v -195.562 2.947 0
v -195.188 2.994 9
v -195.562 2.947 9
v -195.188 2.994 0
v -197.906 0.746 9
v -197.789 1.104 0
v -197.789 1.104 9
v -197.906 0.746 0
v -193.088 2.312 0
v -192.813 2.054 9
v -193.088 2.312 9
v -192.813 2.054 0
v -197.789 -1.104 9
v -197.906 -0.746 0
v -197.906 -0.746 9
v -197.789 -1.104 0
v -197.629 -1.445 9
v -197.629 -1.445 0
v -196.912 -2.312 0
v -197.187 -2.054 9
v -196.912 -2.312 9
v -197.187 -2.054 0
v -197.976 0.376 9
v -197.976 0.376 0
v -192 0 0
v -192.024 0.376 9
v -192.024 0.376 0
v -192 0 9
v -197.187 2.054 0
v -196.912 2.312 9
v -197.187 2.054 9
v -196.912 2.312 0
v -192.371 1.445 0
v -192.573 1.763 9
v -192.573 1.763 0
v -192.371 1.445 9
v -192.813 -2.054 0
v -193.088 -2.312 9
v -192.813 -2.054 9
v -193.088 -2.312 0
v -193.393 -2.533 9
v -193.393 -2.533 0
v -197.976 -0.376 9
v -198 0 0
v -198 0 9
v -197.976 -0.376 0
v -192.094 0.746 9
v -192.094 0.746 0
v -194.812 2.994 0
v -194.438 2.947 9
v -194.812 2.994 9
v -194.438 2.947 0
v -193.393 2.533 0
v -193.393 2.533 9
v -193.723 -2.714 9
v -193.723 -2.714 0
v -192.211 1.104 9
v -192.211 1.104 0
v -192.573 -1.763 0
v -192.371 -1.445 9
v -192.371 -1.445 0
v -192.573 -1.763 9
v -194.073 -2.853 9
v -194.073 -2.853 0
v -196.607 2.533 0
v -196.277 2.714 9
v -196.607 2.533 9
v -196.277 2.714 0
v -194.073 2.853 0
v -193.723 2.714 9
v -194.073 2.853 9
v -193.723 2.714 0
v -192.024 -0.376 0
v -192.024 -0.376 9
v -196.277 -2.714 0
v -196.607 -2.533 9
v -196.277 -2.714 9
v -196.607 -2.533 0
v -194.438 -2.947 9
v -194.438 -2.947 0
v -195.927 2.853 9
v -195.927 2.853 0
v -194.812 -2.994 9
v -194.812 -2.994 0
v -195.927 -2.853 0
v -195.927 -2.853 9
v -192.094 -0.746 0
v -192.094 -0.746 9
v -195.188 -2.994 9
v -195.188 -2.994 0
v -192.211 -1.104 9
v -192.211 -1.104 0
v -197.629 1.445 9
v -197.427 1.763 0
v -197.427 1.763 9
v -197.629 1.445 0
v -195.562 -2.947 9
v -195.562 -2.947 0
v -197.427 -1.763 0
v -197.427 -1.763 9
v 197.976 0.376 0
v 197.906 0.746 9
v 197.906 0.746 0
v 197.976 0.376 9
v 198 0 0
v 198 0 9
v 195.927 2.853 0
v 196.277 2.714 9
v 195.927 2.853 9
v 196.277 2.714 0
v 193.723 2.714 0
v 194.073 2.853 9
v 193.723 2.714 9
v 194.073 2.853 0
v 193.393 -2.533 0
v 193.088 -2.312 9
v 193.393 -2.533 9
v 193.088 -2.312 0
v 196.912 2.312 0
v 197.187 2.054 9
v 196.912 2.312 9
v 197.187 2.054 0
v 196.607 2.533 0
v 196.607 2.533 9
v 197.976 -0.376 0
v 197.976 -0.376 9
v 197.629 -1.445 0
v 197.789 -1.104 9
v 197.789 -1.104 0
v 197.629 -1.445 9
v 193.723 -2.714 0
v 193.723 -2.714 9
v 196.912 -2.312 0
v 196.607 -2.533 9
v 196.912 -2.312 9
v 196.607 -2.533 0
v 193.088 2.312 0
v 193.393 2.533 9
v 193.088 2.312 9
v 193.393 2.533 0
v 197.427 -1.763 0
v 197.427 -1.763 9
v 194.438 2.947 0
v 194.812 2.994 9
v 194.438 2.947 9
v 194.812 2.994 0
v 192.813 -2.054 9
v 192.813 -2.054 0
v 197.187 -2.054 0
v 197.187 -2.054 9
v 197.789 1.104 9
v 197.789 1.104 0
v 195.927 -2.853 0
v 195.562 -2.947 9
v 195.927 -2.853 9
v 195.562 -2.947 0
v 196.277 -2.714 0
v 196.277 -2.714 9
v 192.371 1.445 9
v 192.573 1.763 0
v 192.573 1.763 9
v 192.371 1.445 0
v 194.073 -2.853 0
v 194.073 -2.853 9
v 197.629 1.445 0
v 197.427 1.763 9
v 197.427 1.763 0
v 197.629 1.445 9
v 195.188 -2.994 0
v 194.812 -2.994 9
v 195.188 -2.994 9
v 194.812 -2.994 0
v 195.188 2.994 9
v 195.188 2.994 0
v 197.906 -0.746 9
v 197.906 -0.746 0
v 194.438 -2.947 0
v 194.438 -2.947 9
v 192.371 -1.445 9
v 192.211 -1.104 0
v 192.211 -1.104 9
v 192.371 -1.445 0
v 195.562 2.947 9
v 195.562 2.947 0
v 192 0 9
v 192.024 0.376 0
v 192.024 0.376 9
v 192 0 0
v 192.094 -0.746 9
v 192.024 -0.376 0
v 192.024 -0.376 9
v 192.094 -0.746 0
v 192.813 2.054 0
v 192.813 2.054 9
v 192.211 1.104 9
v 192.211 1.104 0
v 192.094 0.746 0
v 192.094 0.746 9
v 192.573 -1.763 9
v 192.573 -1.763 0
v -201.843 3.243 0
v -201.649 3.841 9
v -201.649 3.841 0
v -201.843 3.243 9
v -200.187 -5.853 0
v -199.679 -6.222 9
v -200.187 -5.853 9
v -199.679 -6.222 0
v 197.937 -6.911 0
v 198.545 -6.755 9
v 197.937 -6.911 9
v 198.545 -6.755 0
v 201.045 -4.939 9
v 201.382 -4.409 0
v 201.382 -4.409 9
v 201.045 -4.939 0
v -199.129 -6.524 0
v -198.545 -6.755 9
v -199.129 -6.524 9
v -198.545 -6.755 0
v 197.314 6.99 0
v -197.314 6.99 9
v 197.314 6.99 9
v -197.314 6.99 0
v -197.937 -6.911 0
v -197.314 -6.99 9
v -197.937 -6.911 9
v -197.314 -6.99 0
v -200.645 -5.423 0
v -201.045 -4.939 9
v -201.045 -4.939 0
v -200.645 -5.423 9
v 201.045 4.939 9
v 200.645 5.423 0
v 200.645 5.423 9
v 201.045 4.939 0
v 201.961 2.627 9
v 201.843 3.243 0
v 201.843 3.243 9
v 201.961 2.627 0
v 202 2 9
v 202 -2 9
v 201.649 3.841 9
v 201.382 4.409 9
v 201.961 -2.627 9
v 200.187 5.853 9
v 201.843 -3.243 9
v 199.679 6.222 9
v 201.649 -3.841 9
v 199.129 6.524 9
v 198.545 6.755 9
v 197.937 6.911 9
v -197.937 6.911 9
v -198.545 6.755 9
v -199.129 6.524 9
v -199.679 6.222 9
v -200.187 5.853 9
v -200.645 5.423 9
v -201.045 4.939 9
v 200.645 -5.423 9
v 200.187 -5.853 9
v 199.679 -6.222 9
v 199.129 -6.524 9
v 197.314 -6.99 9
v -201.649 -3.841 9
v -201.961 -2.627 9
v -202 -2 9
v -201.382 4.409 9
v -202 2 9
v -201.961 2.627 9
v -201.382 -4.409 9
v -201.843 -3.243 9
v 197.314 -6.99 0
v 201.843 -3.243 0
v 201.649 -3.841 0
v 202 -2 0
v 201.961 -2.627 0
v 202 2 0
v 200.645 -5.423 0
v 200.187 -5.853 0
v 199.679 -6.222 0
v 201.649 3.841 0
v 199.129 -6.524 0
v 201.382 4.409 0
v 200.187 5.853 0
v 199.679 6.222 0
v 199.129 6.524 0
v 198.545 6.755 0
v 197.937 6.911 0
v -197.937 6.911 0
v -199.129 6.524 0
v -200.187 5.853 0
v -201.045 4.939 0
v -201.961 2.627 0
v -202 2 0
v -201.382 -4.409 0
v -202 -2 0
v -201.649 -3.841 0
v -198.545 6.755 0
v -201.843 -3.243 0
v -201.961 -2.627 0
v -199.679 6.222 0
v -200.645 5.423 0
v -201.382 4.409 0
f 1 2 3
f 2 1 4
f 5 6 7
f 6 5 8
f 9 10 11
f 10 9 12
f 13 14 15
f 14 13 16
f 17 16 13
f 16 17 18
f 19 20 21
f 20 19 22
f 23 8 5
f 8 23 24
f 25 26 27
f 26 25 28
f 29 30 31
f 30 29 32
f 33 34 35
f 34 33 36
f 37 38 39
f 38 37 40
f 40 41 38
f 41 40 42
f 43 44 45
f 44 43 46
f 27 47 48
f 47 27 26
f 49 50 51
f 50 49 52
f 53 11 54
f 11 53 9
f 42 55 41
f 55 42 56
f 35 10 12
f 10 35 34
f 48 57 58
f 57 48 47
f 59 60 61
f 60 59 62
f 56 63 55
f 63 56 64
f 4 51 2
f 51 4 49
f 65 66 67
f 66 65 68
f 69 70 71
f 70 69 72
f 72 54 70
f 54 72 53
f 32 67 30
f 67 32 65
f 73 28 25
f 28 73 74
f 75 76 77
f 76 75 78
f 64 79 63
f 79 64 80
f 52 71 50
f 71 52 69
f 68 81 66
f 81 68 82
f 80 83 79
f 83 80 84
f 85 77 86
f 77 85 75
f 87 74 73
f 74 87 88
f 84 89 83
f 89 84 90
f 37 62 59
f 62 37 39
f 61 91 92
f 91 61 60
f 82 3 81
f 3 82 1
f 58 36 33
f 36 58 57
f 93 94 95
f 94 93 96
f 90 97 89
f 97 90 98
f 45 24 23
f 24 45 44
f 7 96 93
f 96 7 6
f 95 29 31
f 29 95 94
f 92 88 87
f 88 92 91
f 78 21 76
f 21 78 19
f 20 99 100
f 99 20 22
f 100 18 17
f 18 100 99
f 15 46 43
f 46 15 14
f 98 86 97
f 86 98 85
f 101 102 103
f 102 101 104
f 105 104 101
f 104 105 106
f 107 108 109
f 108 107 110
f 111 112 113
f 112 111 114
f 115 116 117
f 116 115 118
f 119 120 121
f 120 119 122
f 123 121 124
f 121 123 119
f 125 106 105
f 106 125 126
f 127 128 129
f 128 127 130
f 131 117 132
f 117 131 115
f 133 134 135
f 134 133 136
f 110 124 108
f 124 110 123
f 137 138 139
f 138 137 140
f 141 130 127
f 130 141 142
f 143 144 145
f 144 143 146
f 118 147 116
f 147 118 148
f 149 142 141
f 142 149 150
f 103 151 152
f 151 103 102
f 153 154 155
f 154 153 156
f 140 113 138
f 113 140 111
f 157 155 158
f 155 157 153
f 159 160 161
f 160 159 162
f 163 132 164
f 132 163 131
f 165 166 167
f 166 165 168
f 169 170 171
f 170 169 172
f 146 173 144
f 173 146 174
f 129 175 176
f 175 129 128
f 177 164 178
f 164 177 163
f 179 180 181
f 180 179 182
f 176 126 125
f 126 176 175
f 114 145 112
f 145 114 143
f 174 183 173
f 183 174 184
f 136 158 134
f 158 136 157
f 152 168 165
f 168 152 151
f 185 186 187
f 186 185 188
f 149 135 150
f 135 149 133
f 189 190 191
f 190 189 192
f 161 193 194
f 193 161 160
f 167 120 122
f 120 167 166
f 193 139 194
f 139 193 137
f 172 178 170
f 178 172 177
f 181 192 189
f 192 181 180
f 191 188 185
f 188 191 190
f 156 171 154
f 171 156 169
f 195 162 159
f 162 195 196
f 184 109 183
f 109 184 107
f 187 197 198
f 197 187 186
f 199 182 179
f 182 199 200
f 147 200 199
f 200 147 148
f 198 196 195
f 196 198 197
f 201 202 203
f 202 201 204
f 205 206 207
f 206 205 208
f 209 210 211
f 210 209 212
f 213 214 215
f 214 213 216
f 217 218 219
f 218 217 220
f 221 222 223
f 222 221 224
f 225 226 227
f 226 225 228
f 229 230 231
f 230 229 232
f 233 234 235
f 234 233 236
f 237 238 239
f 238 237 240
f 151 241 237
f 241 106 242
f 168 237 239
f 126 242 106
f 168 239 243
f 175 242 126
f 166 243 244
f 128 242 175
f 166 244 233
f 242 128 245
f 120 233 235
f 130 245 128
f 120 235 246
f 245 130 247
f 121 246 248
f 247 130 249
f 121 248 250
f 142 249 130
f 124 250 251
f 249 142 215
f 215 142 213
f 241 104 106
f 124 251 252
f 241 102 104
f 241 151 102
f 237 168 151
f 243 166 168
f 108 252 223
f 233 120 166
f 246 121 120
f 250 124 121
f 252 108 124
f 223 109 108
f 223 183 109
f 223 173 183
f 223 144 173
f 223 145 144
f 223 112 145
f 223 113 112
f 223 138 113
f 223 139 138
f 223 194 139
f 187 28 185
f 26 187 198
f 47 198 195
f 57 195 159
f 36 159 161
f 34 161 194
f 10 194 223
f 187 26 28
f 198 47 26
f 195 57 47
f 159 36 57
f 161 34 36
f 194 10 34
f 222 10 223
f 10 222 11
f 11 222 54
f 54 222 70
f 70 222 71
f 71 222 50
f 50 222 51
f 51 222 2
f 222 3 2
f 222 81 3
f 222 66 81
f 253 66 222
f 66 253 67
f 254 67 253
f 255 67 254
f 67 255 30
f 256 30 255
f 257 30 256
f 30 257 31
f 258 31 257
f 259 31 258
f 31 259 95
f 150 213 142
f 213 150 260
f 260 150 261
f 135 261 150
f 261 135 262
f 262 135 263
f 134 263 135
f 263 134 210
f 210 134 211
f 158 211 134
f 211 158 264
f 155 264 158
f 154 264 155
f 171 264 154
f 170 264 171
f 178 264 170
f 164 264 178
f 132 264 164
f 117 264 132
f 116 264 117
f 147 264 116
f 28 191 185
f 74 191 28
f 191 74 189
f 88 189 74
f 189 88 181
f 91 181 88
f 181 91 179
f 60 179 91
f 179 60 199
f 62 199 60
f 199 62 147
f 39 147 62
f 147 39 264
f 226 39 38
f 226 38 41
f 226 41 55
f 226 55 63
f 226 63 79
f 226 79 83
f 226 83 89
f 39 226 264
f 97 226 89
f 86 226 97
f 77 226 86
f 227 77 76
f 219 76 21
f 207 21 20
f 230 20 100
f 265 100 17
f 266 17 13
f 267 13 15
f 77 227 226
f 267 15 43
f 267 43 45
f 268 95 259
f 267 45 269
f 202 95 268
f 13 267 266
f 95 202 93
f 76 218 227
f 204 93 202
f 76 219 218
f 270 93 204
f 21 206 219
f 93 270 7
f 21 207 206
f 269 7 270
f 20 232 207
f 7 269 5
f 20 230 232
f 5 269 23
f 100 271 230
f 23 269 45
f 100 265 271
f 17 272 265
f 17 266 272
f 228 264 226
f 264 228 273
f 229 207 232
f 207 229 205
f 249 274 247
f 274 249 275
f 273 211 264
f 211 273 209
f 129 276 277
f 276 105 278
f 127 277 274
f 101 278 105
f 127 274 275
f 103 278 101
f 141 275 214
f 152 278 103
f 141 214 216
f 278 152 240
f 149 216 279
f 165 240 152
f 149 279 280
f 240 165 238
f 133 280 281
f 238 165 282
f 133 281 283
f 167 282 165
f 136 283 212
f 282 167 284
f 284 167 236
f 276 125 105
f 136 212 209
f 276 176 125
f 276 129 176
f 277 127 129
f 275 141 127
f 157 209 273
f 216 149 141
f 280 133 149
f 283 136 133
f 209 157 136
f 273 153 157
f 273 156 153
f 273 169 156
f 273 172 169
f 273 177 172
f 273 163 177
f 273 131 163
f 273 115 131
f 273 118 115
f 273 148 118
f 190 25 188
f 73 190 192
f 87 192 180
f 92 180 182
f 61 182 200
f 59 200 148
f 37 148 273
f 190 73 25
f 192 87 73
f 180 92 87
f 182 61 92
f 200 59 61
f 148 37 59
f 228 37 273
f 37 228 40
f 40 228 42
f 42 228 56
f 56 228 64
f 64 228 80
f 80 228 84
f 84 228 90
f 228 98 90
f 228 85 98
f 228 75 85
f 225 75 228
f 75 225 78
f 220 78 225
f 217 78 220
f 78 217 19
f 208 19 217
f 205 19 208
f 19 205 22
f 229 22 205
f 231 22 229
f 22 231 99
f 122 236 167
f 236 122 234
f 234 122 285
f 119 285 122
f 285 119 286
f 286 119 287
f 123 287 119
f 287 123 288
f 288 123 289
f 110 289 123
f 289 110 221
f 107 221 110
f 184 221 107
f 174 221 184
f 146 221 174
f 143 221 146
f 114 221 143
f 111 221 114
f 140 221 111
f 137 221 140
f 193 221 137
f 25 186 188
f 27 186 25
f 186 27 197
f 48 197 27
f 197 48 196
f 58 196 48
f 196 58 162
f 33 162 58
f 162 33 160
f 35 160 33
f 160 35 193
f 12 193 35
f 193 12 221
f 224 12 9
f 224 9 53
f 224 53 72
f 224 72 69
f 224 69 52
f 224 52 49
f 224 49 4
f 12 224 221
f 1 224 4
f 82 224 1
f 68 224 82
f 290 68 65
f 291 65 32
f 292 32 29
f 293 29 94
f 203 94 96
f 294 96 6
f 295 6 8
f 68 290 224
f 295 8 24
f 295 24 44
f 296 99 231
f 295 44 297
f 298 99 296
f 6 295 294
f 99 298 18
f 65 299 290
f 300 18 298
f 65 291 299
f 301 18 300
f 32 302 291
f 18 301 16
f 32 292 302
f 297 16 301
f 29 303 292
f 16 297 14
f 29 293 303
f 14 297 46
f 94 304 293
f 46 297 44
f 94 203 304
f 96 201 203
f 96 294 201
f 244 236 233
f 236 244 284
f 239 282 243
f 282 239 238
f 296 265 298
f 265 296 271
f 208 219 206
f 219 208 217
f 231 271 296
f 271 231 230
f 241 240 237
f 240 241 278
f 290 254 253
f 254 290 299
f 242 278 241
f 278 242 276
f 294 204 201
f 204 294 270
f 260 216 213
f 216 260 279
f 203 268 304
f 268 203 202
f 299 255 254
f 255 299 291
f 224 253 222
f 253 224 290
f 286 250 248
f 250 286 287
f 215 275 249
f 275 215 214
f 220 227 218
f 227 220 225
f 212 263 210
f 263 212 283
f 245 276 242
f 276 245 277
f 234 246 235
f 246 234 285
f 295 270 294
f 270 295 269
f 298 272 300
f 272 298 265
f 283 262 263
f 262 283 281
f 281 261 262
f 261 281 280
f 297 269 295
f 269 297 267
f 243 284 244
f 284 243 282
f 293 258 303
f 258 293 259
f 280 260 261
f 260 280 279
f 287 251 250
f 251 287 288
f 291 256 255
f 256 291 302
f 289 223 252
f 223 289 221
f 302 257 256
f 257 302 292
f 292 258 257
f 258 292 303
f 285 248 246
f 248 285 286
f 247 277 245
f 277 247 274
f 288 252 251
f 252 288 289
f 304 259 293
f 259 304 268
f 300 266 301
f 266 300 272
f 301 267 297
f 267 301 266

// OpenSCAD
$fn = 50;


difference() {
	union() {
		hull() {
			translate(v = [-197.0000000000, 2.0000000000, 0]) {
				cylinder(h = 9, r = 5);
			}
			translate(v = [197.0000000000, 2.0000000000, 0]) {
				cylinder(h = 9, r = 5);
			}
			translate(v = [-197.0000000000, -2.0000000000, 0]) {
				cylinder(h = 9, r = 5);
			}
			translate(v = [197.0000000000, -2.0000000000, 0]) {
				cylinder(h = 9, r = 5);
			}
		}
	}
	union() {
		translate(v = [-195.0000000000, 0.0000000000, -100.0000000000]) {
			cylinder(h = 200, r = 3.0000000000);
		}
		translate(v = [-195.0000000000, 0.0000000000, -100.0000000000]) {
			cylinder(h = 200, r = 3.0000000000);
		}
		translate(v = [195.0000000000, 0.0000000000, -100.0000000000]) {
			cylinder(h = 200, r = 3.0000000000);
		}
		translate(v = [195.0000000000, 0.0000000000, -100.0000000000]) {
			cylinder(h = 200, r = 3.0000000000);
		}
	}
}
